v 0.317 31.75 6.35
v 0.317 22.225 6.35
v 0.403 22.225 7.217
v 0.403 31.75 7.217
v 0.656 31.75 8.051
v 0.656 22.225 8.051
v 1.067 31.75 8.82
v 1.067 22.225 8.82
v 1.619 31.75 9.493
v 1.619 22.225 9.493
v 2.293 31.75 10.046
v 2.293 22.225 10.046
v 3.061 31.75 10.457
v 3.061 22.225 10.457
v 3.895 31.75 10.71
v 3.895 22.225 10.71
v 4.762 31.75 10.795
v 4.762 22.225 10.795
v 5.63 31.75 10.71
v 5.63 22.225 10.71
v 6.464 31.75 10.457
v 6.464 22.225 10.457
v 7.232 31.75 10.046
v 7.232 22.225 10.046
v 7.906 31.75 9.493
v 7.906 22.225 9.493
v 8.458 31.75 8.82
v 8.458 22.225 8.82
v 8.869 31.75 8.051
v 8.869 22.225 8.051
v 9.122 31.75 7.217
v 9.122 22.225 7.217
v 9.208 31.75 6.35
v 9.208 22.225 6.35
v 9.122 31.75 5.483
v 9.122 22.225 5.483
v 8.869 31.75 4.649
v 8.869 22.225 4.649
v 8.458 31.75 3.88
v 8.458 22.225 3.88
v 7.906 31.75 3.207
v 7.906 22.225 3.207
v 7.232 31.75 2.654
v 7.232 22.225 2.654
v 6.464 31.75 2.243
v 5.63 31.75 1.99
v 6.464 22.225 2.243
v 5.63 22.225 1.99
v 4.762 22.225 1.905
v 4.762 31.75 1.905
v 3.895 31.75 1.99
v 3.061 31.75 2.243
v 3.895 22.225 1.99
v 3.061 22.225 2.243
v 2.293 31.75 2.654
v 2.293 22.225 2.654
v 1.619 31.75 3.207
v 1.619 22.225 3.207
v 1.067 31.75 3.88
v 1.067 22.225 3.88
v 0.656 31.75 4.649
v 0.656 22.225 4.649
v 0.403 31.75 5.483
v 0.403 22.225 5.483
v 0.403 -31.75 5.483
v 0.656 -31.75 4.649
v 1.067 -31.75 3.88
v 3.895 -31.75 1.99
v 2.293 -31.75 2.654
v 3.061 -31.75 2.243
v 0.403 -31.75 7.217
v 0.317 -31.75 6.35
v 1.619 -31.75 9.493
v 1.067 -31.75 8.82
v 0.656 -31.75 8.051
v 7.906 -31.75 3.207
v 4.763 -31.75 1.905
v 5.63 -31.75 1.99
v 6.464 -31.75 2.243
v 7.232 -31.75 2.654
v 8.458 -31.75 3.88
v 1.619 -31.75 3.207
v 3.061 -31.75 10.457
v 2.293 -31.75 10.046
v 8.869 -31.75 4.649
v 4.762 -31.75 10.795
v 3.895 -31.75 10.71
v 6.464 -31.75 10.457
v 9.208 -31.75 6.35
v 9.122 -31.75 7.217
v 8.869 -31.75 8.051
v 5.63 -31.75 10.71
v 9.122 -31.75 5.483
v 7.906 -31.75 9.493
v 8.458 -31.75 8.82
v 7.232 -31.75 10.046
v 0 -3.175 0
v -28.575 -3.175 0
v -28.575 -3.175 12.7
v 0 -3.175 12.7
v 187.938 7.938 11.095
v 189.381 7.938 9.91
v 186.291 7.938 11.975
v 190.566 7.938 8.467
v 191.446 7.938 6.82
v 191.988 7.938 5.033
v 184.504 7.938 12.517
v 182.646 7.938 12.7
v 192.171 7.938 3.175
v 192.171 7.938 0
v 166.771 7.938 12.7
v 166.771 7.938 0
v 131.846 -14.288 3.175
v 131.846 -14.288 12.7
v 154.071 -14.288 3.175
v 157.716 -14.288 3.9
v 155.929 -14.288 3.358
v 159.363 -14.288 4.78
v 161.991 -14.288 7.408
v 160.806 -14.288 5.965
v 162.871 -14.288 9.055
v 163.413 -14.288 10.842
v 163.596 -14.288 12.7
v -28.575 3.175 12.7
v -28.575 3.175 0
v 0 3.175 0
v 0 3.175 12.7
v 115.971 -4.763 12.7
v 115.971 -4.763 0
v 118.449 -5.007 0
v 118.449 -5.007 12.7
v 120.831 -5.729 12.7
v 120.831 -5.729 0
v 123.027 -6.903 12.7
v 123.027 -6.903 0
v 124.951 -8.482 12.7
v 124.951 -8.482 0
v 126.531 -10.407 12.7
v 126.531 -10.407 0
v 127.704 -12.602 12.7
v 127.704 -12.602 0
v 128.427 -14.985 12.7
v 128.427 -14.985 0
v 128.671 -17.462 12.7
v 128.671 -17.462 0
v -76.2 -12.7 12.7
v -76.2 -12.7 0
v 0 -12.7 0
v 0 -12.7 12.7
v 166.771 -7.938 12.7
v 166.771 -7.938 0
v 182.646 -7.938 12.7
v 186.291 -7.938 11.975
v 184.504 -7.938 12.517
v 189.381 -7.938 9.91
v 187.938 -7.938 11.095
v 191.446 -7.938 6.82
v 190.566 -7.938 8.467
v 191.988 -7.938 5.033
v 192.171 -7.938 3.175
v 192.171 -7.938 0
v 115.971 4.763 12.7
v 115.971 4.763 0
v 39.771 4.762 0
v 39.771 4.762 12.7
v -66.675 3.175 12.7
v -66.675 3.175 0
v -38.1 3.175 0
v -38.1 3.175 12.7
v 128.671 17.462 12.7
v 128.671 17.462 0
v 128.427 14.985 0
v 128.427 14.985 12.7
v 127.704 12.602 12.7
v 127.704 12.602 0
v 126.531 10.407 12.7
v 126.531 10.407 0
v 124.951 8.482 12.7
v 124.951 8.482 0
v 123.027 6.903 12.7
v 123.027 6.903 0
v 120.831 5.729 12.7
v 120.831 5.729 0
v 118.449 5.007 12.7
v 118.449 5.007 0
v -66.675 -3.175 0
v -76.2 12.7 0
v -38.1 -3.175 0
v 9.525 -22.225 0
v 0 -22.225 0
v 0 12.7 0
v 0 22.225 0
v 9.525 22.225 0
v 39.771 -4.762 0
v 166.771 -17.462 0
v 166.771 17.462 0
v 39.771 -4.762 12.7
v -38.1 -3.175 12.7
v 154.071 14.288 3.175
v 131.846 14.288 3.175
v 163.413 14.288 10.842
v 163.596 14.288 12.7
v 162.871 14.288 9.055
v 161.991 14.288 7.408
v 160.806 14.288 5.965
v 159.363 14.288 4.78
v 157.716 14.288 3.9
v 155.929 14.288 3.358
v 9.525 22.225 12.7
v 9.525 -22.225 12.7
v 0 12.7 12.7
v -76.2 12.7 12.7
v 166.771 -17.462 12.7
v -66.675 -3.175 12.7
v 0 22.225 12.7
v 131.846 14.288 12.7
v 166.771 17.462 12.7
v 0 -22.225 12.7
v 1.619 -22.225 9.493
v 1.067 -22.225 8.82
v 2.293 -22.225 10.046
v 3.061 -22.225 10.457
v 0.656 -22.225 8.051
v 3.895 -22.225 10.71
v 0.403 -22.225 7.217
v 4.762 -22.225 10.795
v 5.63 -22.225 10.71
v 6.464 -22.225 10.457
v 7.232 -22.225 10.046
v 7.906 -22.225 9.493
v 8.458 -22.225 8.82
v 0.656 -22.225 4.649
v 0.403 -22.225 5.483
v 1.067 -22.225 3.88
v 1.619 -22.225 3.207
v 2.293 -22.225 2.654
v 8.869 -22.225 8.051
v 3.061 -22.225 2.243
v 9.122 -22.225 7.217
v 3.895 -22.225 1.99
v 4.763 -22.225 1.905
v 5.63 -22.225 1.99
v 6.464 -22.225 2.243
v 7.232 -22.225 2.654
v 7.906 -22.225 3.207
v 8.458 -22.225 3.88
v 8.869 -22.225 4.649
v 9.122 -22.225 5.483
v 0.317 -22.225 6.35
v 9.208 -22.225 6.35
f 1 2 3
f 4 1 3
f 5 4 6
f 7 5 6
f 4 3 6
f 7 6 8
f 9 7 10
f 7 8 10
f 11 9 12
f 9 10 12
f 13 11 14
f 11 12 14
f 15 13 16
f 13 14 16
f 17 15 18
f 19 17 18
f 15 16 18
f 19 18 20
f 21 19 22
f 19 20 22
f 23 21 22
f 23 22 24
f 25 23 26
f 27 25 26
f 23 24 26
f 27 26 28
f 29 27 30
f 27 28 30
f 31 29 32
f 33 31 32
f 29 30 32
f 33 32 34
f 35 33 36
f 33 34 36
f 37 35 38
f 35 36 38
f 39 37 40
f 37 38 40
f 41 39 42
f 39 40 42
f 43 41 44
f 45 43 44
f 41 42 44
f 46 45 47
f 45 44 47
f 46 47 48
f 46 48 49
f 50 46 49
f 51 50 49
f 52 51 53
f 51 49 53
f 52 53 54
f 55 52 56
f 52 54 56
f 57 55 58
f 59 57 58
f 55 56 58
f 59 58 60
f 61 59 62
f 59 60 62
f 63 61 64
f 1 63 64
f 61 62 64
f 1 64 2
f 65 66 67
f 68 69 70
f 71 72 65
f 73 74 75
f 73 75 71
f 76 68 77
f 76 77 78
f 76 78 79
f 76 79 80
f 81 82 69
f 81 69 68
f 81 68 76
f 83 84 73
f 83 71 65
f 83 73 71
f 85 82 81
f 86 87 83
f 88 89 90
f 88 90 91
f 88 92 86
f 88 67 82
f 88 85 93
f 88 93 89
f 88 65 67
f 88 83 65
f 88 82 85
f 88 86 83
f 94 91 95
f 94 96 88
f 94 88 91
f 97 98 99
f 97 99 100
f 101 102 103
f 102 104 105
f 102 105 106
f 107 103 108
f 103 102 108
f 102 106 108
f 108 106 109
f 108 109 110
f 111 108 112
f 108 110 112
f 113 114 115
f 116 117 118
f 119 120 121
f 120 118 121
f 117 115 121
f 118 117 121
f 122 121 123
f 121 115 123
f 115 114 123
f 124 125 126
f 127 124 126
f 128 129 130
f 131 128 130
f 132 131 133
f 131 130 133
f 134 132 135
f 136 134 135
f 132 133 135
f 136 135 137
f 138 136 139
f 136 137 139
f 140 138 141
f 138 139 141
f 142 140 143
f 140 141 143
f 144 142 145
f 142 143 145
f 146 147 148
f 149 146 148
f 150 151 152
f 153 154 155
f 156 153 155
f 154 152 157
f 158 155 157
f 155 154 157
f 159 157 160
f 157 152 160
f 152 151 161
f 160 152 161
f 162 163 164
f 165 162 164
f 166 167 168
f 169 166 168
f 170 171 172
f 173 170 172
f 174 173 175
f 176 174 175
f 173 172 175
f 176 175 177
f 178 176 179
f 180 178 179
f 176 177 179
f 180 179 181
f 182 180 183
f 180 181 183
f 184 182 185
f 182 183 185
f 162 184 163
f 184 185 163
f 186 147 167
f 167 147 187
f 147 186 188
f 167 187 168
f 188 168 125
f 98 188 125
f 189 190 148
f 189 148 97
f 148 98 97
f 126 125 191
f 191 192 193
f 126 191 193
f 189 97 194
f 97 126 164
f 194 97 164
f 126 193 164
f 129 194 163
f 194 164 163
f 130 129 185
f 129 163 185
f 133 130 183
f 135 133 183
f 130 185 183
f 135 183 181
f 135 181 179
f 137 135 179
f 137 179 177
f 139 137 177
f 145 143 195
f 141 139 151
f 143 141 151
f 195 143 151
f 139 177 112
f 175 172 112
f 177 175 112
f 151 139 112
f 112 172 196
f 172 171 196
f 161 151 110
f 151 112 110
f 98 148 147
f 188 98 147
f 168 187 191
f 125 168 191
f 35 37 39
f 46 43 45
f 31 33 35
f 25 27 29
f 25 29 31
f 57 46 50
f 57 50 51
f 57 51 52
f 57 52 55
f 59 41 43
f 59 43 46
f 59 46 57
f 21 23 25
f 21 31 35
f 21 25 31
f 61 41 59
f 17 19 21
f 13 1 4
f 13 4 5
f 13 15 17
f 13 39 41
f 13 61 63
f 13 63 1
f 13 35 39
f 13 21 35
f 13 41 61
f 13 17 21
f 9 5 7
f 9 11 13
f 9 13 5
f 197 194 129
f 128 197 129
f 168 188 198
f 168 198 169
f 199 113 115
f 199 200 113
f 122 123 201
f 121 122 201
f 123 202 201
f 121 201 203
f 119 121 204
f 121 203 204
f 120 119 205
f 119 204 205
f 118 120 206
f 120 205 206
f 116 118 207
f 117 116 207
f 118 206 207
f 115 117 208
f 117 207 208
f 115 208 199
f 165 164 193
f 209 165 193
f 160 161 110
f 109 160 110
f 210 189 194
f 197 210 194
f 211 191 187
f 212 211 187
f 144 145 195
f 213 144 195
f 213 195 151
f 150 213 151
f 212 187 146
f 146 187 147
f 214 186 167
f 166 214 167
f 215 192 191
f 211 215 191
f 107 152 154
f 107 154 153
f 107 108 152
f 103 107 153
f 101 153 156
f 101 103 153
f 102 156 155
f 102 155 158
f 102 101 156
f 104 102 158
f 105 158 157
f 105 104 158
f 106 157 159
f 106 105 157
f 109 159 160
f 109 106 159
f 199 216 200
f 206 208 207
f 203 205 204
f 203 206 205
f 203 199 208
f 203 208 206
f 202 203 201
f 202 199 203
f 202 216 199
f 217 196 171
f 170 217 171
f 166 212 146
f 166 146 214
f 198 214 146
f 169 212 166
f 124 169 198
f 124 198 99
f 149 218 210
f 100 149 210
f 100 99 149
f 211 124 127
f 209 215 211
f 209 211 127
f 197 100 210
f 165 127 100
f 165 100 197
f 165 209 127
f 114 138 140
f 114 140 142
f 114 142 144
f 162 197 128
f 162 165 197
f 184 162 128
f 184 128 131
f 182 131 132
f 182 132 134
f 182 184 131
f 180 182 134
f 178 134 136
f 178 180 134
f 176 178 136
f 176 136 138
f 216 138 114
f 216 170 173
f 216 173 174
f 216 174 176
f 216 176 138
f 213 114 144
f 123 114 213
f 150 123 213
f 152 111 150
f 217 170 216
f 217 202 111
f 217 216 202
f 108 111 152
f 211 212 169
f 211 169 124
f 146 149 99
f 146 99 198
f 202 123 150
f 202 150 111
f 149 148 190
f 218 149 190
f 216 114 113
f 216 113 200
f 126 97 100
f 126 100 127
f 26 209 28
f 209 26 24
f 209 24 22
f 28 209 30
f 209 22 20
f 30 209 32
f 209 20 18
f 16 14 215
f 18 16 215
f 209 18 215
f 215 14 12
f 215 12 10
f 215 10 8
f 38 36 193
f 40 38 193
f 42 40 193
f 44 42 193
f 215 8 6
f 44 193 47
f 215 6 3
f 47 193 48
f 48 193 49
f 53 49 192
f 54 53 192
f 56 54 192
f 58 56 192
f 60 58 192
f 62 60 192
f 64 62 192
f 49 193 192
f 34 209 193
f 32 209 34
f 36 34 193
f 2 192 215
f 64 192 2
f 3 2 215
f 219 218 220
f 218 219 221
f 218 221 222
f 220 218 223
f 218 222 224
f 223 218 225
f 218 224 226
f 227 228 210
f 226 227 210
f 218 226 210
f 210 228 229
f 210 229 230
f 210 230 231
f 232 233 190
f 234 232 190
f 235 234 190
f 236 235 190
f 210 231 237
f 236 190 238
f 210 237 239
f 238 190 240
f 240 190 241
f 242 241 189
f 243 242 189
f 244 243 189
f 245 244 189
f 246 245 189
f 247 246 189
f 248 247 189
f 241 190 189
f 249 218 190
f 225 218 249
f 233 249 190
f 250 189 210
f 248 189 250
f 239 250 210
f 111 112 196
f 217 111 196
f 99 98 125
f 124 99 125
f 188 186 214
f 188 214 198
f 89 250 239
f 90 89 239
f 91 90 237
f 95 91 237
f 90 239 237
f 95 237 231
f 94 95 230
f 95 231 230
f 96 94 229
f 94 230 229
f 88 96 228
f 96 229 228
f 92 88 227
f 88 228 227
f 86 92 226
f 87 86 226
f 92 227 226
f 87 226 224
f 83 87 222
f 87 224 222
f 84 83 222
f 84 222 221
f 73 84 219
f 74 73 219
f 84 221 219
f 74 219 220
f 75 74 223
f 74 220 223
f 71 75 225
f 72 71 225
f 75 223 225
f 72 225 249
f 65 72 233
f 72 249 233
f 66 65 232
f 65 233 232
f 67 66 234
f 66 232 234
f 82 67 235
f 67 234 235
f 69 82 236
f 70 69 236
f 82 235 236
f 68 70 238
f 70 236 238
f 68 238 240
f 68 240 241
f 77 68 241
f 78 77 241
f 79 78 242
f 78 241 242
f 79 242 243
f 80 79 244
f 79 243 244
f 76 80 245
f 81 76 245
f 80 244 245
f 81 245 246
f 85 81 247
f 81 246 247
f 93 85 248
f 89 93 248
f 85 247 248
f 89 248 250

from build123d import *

# Parameters (mm, degrees)
F0_W     = 28.575
F0_H     = 6.35
F1_DEPTH = 12.7
F2_R     = 4.445
F3_DEPTH = 9.525
F4_R     = 4.445
F5_DEPTH = 9.525
F6_W     = 31.75
F6_H     = 28.575
F7_DEPTH = 9.525
F8_R     = 9.52499


# Not quite as in the source:
# - a fillet or chamfer is up to 0.001 mm smaller than in the source, because OpenCascade refuses the exact size


with BuildPart() as f1:
    # F0 (on Top) → F1 (new body)
    with BuildSketch(Plane.XY):
        with BuildLine():
            Line((-76.2, -12.7), (0, -12.7))
            Line((0, -12.7), (0, -22.225))
            Line((0, -22.225), (9.525, -22.225))
            Line((9.525, -22.225), (39.7709372272, -4.7625))
            Line((39.7709372272, -4.7625), (115.9709372272, -4.7625))
            ThreePointArc((115.9709372272, -4.7625), (124.9511933482, -8.4822438789), (128.6709372272, -17.4625))
            Line((128.6709372272, -17.4625), (166.7709372272, -17.4625))
            Line((166.7709372272, -17.4625), (166.7709372272, -7.9375))
            Line((166.7709372272, -7.9375), (192.1709372272, -7.9375))
            Line((192.1709372272, -7.9375), (192.1709372272, 7.9375))
            Line((192.1709372272, 7.9375), (166.7709372272, 7.9375))
            Line((166.7709372272, 7.9375), (166.7709372272, 17.4625))
            Line((166.7709372272, 17.4625), (128.6709372272, 17.4625))
            ThreePointArc((128.6709372272, 17.4625), (124.9511933482, 8.4822438789), (115.9709372272, 4.7625))
            Line((115.9709372272, 4.7625), (39.7709372272, 4.7625))
            Line((39.7709372272, 4.7625), (9.525, 22.225))
            Line((9.525, 22.225), (0, 22.225))
            Line((0, 22.225), (0, 12.7))
            Line((0, 12.7), (-76.2, 12.7))
            Line((-76.2, 12.7), (-76.2, -12.7))
        make_face()
        with Locations((-52.3875, 0)):
            Rectangle(F0_W, F0_H, mode=Mode.SUBTRACT)
        with Locations((-14.2875, 0)):
            Rectangle(F0_W, F0_H, mode=Mode.SUBTRACT)
    extrude(amount=F1_DEPTH)

    # F2 (on face) → F3 (join)
    with BuildSketch(Plane.XZ.offset(22.225)):
        with Locations((4.7625, 6.35)):
            Circle(F2_R)
    extrude(amount=F3_DEPTH)

    # F4 (on face) → F5 (join)
    with BuildSketch(Plane(origin=(0, 22.225, 0), x_dir=(-1, 0, 0), z_dir=(0, 1, 0))):
        with Locations((-4.7625, 6.35)):
            Circle(F4_R)
    extrude(amount=F5_DEPTH)

    # F6 (on face) → F7 (cut)
    with BuildSketch(Plane.XY.offset(12.7)):
        with Locations((147.7209372272, 0)):
            Rectangle(F6_W, F6_H)
    extrude(amount=-F7_DEPTH, mode=Mode.SUBTRACT)

    # F8 (radius 9.525 in the source; OpenCascade refuses exactly that, so slightly less here)
    f8_edges = [f1.edges().sort_by_distance(p)[0] for p in [
        (163.595937, 0, 3.175),
        (192.170937, 0, 12.7),
    ]]
    fillet(f8_edges, radius=F8_R)


solid = f1.part
